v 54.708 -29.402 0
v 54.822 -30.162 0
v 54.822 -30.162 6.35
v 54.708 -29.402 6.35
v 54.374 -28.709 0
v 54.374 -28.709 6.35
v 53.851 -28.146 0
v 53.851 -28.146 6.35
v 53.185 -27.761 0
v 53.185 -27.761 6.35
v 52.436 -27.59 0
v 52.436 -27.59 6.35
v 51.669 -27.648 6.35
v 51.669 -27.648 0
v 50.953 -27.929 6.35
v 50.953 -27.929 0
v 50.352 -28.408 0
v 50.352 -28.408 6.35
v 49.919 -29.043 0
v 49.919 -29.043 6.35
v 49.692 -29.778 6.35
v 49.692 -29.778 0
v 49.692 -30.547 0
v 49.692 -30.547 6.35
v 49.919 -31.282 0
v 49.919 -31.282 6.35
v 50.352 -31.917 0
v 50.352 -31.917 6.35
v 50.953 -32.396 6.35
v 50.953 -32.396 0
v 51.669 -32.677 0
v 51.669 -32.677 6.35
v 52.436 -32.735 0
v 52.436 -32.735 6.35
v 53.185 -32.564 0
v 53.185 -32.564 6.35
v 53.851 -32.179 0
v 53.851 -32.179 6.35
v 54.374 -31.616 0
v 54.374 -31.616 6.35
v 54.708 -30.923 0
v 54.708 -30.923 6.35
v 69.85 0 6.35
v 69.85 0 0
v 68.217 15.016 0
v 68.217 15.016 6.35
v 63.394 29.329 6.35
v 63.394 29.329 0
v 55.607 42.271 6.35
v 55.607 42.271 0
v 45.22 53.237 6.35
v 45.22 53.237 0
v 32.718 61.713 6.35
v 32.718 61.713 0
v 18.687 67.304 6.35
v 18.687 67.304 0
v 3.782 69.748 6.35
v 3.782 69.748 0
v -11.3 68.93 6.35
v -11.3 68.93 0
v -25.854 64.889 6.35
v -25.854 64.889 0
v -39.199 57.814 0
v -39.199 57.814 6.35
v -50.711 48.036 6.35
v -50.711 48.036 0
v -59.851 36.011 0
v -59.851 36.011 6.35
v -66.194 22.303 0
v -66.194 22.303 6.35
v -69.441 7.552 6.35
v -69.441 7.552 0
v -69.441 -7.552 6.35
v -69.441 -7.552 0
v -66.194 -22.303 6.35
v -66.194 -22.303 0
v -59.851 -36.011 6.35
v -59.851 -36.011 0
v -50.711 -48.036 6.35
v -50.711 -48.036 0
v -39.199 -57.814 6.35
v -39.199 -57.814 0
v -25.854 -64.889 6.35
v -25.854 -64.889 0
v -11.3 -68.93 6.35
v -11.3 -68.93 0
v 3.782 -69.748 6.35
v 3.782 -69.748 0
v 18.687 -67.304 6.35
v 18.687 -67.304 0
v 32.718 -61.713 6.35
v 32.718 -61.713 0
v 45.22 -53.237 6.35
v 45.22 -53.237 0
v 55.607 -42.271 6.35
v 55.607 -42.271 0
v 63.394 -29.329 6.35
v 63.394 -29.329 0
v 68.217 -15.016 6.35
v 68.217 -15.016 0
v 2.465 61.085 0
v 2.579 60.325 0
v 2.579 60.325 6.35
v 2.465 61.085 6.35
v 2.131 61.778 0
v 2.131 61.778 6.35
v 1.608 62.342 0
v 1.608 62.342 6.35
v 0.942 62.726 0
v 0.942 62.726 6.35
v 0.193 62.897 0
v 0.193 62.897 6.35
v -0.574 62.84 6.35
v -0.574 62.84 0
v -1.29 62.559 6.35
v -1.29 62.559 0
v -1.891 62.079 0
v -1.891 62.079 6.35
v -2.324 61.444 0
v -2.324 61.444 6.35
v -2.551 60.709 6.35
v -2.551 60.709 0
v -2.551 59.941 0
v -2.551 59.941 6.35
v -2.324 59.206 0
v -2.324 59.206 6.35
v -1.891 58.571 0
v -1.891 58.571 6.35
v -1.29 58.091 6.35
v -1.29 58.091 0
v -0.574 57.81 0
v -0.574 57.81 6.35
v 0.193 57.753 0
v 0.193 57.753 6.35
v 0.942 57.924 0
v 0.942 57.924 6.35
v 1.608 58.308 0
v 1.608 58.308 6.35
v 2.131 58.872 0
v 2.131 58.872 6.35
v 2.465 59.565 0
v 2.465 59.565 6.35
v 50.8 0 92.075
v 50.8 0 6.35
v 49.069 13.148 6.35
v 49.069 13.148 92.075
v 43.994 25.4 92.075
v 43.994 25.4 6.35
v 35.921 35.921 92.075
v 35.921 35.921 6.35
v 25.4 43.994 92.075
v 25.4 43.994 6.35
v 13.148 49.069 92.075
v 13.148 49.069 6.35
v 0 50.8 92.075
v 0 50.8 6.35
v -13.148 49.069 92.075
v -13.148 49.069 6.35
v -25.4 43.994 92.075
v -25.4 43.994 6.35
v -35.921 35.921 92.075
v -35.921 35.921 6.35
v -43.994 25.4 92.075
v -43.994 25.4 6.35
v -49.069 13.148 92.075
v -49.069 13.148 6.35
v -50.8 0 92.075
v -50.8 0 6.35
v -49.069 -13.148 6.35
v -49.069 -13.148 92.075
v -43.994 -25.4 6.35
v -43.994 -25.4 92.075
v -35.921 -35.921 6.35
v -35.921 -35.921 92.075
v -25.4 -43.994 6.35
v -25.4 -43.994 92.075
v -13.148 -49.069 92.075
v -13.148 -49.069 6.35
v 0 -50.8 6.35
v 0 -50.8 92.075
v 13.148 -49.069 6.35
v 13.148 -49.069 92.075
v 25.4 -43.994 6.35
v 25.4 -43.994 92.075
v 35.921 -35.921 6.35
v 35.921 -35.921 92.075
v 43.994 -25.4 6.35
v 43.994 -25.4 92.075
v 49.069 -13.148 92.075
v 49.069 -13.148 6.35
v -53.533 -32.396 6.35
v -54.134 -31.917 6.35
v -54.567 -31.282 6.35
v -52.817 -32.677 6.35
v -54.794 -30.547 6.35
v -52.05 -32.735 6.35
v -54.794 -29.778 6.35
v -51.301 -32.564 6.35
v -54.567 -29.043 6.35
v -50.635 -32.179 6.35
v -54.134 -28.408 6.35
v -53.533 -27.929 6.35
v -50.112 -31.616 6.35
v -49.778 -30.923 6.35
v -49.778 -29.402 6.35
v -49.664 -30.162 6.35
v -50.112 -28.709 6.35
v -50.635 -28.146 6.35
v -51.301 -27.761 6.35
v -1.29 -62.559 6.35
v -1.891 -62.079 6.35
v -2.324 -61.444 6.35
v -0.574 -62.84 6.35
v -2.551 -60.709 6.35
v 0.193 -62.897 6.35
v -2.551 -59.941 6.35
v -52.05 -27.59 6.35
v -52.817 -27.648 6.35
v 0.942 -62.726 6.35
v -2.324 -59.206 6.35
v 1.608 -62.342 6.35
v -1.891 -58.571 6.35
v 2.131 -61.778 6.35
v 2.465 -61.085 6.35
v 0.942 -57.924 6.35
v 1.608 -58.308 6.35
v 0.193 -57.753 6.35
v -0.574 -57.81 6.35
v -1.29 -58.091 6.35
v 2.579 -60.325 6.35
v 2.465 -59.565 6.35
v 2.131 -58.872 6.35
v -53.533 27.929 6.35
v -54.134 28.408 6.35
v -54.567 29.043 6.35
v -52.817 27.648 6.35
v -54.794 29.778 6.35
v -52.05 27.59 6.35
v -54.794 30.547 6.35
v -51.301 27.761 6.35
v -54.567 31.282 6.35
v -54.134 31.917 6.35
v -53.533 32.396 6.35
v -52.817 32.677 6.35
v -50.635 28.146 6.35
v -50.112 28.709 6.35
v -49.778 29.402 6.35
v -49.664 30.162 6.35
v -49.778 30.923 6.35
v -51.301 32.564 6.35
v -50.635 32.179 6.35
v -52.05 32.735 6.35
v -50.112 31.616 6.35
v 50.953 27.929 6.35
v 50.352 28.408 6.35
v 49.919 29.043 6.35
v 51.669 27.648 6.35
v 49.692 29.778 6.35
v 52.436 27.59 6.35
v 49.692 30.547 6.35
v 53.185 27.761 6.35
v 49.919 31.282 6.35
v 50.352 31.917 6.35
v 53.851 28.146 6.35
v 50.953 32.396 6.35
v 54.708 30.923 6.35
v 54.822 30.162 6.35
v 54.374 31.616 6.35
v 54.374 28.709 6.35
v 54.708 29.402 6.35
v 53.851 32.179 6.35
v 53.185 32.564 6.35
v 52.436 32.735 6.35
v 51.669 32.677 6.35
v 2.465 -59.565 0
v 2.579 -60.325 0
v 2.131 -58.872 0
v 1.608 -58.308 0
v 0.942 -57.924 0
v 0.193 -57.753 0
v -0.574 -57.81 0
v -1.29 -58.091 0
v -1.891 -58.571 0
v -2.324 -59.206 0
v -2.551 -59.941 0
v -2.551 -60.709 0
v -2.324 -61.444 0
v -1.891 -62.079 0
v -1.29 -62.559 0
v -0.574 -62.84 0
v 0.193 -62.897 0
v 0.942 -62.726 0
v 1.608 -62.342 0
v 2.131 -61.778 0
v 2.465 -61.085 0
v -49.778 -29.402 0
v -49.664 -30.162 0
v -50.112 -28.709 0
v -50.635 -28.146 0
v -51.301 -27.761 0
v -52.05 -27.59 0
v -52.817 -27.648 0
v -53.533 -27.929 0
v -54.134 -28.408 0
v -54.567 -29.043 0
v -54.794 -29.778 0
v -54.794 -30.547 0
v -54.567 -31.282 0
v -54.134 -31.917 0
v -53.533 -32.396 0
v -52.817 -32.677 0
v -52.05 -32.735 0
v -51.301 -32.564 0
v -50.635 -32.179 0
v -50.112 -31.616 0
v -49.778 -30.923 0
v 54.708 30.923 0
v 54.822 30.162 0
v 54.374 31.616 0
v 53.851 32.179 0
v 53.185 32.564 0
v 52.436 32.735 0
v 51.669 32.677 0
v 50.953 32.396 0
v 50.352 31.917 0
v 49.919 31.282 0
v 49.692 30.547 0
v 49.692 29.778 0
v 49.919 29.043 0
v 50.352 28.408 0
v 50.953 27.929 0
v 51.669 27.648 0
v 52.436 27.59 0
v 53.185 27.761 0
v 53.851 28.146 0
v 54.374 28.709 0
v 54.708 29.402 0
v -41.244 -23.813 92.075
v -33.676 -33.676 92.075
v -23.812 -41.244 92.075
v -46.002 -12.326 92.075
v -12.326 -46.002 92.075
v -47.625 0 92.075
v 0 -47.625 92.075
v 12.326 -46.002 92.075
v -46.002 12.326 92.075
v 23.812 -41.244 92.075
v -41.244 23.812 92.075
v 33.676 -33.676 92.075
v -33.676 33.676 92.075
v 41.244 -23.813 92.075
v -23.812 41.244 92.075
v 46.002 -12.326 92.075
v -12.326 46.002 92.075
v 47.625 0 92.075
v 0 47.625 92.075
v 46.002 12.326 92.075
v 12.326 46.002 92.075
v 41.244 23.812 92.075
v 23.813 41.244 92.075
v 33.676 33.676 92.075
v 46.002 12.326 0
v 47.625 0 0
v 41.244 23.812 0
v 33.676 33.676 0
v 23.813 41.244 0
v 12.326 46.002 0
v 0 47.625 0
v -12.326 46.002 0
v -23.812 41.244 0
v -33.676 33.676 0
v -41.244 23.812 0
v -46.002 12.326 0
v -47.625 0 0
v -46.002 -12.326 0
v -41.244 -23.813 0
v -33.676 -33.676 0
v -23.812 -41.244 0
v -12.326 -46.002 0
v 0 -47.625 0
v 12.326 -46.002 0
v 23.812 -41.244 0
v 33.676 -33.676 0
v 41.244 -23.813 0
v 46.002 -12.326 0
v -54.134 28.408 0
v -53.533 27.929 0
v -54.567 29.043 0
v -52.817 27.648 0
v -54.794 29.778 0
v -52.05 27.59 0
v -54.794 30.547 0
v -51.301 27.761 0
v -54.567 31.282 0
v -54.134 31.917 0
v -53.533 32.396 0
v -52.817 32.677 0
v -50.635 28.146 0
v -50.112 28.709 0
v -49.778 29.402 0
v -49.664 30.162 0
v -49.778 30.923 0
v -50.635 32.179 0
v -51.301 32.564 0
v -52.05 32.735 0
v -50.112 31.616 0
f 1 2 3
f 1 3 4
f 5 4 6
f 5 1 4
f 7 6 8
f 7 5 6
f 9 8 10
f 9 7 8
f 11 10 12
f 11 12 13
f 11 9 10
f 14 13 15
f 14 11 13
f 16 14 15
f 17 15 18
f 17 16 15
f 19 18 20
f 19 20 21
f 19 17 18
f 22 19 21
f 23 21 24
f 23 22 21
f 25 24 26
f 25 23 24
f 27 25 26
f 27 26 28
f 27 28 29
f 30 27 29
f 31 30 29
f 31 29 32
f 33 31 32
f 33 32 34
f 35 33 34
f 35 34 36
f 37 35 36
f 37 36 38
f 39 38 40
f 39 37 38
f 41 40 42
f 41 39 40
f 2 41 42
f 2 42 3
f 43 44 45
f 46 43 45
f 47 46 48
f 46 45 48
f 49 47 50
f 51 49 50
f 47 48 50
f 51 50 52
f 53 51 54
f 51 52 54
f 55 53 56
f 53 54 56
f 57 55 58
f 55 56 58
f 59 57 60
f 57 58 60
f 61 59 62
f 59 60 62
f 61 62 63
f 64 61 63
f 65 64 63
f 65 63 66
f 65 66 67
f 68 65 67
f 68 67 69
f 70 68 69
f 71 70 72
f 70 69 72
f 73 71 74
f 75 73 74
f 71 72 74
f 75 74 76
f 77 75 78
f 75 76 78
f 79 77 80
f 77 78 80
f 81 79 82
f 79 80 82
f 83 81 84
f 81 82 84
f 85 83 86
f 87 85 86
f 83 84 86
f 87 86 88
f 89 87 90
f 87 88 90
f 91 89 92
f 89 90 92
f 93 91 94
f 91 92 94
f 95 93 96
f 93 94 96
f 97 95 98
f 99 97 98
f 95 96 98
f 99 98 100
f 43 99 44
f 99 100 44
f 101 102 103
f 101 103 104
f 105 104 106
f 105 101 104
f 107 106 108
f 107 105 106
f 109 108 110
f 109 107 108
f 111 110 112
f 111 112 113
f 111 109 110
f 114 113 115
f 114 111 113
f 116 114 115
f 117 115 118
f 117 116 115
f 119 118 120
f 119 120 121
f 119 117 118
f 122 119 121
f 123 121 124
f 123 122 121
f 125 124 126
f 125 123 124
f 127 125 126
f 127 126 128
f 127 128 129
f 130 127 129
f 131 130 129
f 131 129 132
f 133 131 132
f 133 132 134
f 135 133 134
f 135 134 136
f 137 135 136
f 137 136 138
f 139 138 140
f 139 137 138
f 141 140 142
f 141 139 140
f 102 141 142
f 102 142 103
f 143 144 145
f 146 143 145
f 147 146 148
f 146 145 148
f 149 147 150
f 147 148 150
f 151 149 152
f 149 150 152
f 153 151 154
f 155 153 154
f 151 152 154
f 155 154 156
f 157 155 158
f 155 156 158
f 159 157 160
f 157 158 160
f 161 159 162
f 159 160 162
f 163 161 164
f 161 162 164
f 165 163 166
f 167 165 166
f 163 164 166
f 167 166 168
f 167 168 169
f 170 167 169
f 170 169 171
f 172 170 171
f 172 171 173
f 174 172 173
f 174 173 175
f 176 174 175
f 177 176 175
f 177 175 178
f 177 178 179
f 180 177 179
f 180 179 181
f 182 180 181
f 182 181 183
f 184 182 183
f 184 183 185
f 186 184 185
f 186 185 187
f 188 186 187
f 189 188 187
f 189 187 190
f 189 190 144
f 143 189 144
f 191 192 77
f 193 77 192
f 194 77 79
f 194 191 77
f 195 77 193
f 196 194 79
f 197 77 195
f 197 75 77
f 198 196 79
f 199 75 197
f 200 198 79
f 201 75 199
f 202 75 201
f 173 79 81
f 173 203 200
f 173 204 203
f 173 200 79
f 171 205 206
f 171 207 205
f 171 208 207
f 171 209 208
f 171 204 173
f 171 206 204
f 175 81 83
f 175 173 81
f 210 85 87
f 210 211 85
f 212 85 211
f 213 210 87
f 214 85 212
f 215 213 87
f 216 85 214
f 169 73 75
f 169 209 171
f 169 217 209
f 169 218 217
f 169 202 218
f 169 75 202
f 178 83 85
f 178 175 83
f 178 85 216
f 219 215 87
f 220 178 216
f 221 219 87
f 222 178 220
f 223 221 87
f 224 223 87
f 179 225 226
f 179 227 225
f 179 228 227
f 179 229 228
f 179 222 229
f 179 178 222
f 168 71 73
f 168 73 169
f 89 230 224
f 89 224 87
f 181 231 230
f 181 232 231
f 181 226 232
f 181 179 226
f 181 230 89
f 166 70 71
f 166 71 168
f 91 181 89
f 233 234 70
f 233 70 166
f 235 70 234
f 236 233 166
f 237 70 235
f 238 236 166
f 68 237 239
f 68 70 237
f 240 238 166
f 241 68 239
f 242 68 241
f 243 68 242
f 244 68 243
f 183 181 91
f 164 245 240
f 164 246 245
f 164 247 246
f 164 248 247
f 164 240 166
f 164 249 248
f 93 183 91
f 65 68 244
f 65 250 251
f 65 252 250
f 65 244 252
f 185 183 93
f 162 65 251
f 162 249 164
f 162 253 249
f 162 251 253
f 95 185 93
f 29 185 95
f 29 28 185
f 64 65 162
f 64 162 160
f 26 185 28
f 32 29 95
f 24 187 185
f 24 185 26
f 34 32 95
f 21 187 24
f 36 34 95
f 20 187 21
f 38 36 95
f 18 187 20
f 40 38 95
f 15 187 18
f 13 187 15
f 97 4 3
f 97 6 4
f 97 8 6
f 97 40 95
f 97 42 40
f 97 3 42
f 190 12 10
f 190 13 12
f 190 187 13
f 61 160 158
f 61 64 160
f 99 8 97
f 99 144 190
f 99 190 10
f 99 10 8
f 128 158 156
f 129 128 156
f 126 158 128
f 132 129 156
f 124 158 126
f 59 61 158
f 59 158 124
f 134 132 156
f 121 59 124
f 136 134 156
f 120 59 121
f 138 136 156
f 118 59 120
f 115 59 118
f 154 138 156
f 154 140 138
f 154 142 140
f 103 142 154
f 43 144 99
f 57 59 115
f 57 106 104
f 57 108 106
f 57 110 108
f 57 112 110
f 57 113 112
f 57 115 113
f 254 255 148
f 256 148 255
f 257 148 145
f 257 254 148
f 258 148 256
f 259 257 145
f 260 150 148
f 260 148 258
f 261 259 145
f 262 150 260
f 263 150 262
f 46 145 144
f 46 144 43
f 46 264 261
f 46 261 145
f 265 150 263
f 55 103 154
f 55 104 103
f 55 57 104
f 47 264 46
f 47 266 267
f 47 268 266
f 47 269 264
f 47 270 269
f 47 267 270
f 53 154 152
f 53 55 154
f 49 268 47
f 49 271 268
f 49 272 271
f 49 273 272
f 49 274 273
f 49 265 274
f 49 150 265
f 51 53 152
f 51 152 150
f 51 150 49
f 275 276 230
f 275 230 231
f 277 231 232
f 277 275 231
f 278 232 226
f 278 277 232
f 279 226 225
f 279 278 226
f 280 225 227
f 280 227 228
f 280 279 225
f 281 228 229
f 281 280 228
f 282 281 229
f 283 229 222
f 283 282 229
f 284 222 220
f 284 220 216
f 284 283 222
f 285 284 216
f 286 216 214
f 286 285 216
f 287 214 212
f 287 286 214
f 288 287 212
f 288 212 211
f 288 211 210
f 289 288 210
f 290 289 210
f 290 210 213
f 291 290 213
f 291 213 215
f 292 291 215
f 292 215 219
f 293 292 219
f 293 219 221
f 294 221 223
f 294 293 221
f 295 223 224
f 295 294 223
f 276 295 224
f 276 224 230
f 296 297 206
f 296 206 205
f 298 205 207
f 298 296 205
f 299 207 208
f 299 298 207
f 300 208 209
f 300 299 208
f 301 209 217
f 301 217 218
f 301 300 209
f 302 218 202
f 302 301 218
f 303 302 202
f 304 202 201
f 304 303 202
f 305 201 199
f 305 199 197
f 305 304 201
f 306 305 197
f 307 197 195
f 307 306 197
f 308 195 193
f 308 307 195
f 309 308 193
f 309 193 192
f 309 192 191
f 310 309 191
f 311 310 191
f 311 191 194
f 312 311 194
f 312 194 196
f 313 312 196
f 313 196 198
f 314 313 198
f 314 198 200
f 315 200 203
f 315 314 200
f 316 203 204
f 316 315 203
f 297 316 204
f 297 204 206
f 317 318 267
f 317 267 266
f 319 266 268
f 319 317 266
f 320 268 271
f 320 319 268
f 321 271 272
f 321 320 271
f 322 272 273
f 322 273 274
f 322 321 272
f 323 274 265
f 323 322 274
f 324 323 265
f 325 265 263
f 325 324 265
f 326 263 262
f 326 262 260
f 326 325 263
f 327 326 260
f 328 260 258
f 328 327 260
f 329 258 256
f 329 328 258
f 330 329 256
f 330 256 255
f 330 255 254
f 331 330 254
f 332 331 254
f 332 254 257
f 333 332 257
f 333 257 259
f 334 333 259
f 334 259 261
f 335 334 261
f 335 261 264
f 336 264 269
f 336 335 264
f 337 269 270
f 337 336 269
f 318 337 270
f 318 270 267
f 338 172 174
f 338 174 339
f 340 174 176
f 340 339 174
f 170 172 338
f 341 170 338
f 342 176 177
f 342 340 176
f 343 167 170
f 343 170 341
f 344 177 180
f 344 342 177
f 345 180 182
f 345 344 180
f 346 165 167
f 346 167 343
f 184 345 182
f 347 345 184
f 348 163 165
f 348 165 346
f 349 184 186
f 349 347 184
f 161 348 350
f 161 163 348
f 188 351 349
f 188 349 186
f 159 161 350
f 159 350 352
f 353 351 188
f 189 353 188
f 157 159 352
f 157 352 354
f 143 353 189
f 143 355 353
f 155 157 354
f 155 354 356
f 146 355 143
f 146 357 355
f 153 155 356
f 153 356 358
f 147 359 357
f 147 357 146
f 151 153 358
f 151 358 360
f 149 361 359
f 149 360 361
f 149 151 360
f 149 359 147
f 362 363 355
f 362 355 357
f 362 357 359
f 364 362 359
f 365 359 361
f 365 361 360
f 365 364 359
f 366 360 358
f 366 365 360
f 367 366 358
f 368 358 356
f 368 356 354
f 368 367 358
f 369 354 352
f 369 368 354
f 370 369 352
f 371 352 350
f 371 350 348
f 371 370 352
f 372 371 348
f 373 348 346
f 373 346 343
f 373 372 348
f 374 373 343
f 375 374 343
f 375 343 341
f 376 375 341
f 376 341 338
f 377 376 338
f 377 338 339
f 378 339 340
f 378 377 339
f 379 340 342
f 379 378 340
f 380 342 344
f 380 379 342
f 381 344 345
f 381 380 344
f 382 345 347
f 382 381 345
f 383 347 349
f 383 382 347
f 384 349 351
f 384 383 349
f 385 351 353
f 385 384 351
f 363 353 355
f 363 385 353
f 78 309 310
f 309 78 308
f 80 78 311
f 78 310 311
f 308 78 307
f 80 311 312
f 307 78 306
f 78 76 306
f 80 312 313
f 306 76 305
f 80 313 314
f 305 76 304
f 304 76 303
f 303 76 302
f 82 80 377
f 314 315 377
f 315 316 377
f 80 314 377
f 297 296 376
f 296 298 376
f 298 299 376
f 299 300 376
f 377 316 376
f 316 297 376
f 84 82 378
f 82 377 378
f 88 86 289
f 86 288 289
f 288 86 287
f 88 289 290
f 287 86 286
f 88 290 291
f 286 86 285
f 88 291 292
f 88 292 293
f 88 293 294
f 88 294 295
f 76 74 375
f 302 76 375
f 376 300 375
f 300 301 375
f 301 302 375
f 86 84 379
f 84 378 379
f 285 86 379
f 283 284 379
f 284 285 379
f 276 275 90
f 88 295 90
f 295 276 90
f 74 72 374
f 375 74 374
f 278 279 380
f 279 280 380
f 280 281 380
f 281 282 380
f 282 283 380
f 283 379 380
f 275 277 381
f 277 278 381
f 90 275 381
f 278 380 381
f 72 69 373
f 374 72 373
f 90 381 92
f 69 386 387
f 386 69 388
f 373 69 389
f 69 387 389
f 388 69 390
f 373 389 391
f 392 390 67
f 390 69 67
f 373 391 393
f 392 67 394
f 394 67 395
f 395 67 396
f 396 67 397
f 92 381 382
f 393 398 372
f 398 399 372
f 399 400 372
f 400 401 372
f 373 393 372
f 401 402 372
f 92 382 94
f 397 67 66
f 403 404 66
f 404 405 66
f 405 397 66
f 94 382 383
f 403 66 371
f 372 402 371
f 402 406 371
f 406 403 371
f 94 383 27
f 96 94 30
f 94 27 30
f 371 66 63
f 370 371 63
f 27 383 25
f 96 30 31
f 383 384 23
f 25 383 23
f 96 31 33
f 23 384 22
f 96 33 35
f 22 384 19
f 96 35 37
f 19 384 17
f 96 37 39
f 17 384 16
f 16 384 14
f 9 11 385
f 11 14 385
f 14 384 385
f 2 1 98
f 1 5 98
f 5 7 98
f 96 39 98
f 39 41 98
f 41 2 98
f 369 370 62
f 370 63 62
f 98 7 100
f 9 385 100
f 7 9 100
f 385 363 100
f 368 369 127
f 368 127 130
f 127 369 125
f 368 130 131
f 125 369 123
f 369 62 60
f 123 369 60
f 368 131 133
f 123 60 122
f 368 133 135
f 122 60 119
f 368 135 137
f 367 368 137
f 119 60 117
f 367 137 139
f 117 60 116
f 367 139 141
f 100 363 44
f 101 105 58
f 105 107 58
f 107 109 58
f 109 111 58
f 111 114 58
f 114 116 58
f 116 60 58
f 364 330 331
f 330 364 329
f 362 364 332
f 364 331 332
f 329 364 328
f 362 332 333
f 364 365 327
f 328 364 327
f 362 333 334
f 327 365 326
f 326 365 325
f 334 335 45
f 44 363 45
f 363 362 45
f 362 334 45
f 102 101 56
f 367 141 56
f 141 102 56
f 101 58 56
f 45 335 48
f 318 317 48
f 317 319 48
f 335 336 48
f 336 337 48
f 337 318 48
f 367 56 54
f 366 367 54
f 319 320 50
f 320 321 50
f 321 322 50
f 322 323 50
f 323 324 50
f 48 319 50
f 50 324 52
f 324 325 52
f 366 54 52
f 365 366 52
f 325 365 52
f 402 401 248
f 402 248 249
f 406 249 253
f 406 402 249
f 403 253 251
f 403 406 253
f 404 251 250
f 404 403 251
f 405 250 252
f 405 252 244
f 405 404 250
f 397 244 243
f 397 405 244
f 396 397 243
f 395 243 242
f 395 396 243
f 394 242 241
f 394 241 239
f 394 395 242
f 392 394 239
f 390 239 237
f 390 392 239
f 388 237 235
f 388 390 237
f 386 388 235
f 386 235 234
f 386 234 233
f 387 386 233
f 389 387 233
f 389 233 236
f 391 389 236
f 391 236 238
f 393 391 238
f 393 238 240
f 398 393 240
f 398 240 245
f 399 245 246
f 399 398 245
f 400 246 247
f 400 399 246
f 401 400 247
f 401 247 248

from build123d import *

# Parameters (mm, degrees)
SKETCH1_R      = 69.85
SKETCH1_R_2    = 50.8
SKETCH1_R_3    = 2.57937
EXTRUDE1_DEPTH = 6.35
SKETCH2_R      = 50.8
SKETCH2_R_2    = 47.625
EXTRUDE2_DEPTH = 92.075


with BuildPart() as part:
    # Sketch1 → Extrude1 (new body)
    with BuildSketch(Plane.XY):
        Circle(SKETCH1_R)
        Circle(SKETCH1_R_2, mode=Mode.SUBTRACT)
        with Locations((0, 60.325)):
            Circle(SKETCH1_R_3, mode=Mode.SUBTRACT)
        with Locations((-52.242982483, 30.1625)):
            Circle(SKETCH1_R_3, mode=Mode.SUBTRACT)
        with Locations((-52.242982483, -30.1625)):
            Circle(SKETCH1_R_3, mode=Mode.SUBTRACT)
        with Locations((0, -60.325)):
            Circle(SKETCH1_R_3, mode=Mode.SUBTRACT)
        with Locations((52.242982483, -30.1625)):
            Circle(SKETCH1_R_3, mode=Mode.SUBTRACT)
        with Locations((52.242982483, 30.1625)):
            Circle(SKETCH1_R_3, mode=Mode.SUBTRACT)
    extrude(amount=EXTRUDE1_DEPTH)

    # Sketch2 → Extrude2 (add)
    with BuildSketch(Plane.XY):
        Circle(SKETCH2_R)
        Circle(SKETCH2_R_2, mode=Mode.SUBTRACT)
    extrude(amount=EXTRUDE2_DEPTH)


solid = part.part
